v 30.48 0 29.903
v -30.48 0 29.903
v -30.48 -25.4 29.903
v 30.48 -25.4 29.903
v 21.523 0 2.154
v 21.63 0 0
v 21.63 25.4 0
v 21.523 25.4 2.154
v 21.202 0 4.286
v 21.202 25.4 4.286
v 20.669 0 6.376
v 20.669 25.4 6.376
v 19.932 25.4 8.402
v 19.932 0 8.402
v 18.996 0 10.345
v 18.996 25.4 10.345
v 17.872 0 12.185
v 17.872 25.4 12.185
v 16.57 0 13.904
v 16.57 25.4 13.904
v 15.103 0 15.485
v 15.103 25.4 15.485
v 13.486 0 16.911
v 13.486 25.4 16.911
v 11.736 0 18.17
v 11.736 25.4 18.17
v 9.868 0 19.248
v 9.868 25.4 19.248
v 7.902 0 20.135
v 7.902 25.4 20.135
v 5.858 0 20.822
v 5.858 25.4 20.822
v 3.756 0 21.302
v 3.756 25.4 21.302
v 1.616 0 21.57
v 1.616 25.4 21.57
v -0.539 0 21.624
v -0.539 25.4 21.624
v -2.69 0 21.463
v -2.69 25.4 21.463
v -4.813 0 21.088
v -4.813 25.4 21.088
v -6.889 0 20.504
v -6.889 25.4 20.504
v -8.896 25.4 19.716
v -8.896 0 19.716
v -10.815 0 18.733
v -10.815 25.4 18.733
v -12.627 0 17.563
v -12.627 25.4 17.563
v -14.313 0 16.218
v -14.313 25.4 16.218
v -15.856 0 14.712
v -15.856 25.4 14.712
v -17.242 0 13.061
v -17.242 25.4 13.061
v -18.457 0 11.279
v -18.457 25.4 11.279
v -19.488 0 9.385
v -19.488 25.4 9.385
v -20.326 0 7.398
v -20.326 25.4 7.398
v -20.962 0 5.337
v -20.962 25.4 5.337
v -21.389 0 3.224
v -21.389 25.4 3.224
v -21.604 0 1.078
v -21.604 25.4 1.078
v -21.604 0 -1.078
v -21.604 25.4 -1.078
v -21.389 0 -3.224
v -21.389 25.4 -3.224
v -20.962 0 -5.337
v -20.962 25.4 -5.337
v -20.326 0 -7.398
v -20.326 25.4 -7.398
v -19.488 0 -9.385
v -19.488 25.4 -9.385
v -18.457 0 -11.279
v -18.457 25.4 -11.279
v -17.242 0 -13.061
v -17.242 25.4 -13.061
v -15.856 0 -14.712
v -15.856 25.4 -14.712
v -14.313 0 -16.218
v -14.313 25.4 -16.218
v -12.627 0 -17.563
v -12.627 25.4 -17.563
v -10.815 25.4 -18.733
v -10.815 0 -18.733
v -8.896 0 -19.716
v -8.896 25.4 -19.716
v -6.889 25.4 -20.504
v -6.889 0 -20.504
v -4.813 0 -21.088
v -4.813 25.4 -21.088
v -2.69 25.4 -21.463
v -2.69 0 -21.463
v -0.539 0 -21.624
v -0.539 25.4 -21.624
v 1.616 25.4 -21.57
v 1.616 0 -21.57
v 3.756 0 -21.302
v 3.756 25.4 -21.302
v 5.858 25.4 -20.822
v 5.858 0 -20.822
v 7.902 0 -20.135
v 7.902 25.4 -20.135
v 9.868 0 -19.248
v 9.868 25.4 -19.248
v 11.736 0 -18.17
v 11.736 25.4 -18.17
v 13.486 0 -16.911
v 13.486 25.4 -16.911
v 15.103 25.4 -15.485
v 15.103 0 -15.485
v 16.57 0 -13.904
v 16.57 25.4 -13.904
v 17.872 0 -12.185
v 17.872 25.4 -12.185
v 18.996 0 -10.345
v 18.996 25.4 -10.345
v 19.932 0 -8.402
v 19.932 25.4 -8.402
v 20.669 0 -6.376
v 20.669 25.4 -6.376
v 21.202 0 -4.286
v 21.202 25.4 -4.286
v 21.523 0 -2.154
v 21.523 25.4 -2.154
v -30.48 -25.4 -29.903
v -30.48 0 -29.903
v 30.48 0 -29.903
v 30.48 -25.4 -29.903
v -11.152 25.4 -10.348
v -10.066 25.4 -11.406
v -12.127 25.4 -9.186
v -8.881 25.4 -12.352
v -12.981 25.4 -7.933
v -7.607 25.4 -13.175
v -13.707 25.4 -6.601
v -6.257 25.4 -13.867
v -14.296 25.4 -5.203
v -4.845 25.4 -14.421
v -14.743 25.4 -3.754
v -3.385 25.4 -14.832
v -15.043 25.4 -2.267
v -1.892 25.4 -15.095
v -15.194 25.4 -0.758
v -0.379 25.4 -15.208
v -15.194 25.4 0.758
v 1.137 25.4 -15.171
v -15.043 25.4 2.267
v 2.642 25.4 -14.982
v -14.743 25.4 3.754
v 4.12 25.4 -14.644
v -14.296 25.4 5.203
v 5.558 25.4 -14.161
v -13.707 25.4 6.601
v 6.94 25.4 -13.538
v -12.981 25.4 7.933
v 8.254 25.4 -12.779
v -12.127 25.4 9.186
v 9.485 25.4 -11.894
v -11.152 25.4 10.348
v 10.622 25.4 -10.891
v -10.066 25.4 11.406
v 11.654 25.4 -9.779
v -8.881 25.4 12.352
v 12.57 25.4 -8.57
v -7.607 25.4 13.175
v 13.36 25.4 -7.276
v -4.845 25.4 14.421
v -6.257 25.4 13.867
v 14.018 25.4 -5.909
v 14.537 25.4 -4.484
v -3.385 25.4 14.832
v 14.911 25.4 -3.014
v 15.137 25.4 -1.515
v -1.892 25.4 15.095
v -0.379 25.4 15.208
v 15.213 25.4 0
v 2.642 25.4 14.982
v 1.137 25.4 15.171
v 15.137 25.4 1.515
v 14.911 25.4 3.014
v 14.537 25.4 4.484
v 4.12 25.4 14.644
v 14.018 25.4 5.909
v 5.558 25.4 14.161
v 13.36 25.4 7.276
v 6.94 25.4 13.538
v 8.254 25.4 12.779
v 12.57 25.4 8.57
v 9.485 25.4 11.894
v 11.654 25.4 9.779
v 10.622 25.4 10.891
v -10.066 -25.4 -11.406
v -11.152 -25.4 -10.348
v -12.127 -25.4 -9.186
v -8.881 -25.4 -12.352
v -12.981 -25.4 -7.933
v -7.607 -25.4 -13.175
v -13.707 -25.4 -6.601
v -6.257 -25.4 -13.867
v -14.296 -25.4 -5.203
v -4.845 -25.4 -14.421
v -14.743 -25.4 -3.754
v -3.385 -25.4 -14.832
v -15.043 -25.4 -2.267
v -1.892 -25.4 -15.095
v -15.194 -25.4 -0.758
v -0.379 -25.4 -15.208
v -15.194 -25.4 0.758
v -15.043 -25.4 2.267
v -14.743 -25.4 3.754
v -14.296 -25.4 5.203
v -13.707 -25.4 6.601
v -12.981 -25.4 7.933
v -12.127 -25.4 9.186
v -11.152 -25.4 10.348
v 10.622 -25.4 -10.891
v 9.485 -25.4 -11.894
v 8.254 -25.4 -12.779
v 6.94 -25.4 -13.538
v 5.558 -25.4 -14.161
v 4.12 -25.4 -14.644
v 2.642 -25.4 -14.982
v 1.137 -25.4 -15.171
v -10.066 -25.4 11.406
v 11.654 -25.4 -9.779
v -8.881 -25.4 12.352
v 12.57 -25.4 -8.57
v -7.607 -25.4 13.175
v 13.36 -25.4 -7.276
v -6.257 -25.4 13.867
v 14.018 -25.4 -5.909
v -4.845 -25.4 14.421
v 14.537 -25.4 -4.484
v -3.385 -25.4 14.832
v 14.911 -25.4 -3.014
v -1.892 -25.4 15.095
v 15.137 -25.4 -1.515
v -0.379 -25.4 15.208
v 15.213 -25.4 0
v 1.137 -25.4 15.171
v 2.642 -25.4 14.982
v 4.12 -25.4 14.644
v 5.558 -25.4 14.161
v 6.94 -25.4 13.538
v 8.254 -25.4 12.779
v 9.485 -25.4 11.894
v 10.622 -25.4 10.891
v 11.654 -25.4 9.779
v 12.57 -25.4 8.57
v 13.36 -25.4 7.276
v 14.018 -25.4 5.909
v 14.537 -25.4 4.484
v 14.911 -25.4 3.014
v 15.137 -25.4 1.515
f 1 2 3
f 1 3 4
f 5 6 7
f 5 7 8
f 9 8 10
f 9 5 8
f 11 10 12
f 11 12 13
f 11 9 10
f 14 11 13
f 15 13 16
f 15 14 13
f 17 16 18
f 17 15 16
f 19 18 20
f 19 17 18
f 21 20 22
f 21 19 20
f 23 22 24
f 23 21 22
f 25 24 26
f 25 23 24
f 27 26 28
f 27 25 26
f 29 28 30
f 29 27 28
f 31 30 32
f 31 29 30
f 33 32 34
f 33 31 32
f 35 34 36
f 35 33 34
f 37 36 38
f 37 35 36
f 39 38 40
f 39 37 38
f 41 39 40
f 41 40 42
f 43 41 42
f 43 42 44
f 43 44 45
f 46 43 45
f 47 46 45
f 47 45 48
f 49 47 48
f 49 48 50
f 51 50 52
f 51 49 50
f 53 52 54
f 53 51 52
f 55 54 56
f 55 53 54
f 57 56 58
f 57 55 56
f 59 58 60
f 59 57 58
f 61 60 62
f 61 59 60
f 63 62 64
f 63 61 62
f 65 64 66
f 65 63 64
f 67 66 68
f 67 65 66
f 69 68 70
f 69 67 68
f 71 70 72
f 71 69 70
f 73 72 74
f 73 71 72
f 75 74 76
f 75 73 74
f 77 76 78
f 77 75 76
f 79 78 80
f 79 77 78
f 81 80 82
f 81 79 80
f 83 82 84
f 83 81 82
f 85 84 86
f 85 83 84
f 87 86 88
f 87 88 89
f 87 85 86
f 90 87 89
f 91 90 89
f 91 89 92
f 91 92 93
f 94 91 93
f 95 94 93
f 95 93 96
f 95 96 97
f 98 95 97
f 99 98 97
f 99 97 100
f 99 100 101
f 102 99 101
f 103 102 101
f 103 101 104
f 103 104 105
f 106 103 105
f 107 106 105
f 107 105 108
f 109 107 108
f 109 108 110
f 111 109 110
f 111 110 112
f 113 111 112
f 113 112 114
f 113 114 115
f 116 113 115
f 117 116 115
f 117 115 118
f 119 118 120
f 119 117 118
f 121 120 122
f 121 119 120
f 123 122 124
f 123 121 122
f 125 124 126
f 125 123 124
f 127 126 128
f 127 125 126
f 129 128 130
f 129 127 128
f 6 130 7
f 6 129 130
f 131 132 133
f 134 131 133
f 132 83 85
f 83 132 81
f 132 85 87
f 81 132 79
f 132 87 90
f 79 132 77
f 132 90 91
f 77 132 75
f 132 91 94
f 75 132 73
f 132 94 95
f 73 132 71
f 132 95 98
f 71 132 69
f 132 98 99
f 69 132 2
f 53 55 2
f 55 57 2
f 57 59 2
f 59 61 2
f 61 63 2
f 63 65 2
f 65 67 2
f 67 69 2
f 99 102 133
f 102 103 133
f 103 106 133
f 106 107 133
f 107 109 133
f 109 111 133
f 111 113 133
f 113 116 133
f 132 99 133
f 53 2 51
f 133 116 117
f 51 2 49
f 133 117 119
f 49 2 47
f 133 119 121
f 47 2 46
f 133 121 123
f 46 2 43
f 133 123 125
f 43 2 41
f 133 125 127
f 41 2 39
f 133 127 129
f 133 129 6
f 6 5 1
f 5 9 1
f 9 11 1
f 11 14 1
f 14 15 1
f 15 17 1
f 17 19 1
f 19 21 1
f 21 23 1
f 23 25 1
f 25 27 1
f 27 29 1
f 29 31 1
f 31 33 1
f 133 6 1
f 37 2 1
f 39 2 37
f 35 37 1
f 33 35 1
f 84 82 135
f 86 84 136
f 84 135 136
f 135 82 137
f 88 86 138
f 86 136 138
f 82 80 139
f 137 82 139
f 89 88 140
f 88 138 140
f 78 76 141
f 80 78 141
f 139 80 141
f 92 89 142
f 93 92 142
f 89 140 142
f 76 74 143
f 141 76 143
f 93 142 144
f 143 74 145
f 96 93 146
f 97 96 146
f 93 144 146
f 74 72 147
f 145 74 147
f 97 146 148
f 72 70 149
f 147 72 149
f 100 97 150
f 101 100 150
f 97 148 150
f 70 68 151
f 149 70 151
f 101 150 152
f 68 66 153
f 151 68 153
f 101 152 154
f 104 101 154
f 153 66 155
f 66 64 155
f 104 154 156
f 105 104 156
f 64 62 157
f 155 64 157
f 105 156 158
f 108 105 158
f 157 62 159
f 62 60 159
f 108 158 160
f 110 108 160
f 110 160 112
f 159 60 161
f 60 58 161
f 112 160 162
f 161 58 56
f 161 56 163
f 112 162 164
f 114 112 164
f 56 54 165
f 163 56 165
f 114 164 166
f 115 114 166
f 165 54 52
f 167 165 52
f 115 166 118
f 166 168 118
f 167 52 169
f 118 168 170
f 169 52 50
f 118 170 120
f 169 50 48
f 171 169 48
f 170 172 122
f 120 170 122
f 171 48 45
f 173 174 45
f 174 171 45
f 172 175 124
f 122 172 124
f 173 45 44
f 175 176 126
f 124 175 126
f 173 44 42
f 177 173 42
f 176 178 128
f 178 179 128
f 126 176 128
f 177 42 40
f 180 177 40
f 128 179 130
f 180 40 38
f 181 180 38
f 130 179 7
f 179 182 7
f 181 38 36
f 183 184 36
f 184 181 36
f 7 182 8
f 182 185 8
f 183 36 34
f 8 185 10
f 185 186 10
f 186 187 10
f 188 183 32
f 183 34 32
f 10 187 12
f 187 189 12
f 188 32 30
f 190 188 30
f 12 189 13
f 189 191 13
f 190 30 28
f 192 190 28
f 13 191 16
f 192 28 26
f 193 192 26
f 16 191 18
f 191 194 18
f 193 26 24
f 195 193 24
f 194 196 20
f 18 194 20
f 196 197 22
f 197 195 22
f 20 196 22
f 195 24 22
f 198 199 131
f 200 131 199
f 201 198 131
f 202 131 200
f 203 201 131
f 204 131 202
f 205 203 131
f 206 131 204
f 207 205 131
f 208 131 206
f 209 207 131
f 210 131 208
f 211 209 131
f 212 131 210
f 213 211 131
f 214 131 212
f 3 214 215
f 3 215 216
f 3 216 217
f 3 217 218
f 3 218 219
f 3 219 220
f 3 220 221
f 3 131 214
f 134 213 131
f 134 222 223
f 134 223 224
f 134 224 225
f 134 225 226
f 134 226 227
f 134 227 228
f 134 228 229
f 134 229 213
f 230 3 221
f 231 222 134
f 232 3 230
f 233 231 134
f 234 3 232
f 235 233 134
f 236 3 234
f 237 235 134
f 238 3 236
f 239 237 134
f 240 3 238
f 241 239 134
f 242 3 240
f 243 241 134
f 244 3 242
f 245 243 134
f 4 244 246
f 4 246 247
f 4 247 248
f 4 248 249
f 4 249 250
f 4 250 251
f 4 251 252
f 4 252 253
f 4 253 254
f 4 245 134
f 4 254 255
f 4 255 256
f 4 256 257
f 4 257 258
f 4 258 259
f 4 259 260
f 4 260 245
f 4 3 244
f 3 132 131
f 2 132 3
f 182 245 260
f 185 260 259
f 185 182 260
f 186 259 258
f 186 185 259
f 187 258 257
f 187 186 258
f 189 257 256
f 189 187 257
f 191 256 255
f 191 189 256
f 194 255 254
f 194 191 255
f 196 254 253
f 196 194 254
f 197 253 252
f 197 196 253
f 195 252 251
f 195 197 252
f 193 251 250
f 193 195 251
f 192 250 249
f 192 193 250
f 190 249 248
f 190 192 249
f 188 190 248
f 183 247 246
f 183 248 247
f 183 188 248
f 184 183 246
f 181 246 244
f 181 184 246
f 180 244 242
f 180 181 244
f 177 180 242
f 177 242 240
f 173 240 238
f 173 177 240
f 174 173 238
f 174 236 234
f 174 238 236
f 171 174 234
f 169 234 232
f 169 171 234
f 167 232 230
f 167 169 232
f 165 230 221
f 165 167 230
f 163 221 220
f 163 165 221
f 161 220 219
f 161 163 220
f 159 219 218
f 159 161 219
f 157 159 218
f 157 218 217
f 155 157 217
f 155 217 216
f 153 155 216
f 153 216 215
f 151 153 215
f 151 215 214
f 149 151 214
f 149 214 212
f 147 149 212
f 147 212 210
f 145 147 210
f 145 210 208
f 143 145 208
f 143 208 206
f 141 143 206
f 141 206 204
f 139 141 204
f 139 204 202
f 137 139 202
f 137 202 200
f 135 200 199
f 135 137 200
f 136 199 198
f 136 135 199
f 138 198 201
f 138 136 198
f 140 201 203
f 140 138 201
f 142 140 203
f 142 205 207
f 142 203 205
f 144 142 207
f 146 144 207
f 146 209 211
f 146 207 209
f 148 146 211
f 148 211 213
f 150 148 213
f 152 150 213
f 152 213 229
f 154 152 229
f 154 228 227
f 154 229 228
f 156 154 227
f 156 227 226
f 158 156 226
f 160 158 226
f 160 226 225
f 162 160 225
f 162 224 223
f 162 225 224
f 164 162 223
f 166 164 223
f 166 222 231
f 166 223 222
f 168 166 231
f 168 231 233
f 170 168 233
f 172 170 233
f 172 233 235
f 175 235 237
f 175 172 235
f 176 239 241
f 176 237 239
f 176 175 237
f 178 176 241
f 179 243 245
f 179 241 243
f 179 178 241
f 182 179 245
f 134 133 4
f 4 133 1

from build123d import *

# Parameters (mm, degrees)
F0_W      = 60.959998
F0_H      = 59.805452
F1_DEPTH  = 25.4
F2_R      = 21.630453
F2_R_2    = 15.213086
F3_DEPTH  = 25.4
F3_FACE_R = 15.213086
F4_DEPTH  = 25.4


with BuildPart() as f1:
    # F0 (on Front) → F1 (new body)
    with BuildSketch(Plane.XZ):
        Rectangle(F0_W, F0_H)
    extrude(amount=F1_DEPTH)

    # F2 (on Front) → F3 (join, symmetric)
    with BuildSketch(Plane.XZ):
        Circle(F2_R)
        Circle(F2_R_2, mode=Mode.SUBTRACT)
    extrude(amount=F3_DEPTH, both=True)

    # F3_face (on face) → F4 (cut)
    with BuildSketch(Plane(origin=(0, 0, 0), x_dir=(1, 0, 0), z_dir=(0, 1, 0))):
        Circle(F3_FACE_R)
    extrude(amount=-F4_DEPTH, mode=Mode.SUBTRACT)


solid = f1.part
